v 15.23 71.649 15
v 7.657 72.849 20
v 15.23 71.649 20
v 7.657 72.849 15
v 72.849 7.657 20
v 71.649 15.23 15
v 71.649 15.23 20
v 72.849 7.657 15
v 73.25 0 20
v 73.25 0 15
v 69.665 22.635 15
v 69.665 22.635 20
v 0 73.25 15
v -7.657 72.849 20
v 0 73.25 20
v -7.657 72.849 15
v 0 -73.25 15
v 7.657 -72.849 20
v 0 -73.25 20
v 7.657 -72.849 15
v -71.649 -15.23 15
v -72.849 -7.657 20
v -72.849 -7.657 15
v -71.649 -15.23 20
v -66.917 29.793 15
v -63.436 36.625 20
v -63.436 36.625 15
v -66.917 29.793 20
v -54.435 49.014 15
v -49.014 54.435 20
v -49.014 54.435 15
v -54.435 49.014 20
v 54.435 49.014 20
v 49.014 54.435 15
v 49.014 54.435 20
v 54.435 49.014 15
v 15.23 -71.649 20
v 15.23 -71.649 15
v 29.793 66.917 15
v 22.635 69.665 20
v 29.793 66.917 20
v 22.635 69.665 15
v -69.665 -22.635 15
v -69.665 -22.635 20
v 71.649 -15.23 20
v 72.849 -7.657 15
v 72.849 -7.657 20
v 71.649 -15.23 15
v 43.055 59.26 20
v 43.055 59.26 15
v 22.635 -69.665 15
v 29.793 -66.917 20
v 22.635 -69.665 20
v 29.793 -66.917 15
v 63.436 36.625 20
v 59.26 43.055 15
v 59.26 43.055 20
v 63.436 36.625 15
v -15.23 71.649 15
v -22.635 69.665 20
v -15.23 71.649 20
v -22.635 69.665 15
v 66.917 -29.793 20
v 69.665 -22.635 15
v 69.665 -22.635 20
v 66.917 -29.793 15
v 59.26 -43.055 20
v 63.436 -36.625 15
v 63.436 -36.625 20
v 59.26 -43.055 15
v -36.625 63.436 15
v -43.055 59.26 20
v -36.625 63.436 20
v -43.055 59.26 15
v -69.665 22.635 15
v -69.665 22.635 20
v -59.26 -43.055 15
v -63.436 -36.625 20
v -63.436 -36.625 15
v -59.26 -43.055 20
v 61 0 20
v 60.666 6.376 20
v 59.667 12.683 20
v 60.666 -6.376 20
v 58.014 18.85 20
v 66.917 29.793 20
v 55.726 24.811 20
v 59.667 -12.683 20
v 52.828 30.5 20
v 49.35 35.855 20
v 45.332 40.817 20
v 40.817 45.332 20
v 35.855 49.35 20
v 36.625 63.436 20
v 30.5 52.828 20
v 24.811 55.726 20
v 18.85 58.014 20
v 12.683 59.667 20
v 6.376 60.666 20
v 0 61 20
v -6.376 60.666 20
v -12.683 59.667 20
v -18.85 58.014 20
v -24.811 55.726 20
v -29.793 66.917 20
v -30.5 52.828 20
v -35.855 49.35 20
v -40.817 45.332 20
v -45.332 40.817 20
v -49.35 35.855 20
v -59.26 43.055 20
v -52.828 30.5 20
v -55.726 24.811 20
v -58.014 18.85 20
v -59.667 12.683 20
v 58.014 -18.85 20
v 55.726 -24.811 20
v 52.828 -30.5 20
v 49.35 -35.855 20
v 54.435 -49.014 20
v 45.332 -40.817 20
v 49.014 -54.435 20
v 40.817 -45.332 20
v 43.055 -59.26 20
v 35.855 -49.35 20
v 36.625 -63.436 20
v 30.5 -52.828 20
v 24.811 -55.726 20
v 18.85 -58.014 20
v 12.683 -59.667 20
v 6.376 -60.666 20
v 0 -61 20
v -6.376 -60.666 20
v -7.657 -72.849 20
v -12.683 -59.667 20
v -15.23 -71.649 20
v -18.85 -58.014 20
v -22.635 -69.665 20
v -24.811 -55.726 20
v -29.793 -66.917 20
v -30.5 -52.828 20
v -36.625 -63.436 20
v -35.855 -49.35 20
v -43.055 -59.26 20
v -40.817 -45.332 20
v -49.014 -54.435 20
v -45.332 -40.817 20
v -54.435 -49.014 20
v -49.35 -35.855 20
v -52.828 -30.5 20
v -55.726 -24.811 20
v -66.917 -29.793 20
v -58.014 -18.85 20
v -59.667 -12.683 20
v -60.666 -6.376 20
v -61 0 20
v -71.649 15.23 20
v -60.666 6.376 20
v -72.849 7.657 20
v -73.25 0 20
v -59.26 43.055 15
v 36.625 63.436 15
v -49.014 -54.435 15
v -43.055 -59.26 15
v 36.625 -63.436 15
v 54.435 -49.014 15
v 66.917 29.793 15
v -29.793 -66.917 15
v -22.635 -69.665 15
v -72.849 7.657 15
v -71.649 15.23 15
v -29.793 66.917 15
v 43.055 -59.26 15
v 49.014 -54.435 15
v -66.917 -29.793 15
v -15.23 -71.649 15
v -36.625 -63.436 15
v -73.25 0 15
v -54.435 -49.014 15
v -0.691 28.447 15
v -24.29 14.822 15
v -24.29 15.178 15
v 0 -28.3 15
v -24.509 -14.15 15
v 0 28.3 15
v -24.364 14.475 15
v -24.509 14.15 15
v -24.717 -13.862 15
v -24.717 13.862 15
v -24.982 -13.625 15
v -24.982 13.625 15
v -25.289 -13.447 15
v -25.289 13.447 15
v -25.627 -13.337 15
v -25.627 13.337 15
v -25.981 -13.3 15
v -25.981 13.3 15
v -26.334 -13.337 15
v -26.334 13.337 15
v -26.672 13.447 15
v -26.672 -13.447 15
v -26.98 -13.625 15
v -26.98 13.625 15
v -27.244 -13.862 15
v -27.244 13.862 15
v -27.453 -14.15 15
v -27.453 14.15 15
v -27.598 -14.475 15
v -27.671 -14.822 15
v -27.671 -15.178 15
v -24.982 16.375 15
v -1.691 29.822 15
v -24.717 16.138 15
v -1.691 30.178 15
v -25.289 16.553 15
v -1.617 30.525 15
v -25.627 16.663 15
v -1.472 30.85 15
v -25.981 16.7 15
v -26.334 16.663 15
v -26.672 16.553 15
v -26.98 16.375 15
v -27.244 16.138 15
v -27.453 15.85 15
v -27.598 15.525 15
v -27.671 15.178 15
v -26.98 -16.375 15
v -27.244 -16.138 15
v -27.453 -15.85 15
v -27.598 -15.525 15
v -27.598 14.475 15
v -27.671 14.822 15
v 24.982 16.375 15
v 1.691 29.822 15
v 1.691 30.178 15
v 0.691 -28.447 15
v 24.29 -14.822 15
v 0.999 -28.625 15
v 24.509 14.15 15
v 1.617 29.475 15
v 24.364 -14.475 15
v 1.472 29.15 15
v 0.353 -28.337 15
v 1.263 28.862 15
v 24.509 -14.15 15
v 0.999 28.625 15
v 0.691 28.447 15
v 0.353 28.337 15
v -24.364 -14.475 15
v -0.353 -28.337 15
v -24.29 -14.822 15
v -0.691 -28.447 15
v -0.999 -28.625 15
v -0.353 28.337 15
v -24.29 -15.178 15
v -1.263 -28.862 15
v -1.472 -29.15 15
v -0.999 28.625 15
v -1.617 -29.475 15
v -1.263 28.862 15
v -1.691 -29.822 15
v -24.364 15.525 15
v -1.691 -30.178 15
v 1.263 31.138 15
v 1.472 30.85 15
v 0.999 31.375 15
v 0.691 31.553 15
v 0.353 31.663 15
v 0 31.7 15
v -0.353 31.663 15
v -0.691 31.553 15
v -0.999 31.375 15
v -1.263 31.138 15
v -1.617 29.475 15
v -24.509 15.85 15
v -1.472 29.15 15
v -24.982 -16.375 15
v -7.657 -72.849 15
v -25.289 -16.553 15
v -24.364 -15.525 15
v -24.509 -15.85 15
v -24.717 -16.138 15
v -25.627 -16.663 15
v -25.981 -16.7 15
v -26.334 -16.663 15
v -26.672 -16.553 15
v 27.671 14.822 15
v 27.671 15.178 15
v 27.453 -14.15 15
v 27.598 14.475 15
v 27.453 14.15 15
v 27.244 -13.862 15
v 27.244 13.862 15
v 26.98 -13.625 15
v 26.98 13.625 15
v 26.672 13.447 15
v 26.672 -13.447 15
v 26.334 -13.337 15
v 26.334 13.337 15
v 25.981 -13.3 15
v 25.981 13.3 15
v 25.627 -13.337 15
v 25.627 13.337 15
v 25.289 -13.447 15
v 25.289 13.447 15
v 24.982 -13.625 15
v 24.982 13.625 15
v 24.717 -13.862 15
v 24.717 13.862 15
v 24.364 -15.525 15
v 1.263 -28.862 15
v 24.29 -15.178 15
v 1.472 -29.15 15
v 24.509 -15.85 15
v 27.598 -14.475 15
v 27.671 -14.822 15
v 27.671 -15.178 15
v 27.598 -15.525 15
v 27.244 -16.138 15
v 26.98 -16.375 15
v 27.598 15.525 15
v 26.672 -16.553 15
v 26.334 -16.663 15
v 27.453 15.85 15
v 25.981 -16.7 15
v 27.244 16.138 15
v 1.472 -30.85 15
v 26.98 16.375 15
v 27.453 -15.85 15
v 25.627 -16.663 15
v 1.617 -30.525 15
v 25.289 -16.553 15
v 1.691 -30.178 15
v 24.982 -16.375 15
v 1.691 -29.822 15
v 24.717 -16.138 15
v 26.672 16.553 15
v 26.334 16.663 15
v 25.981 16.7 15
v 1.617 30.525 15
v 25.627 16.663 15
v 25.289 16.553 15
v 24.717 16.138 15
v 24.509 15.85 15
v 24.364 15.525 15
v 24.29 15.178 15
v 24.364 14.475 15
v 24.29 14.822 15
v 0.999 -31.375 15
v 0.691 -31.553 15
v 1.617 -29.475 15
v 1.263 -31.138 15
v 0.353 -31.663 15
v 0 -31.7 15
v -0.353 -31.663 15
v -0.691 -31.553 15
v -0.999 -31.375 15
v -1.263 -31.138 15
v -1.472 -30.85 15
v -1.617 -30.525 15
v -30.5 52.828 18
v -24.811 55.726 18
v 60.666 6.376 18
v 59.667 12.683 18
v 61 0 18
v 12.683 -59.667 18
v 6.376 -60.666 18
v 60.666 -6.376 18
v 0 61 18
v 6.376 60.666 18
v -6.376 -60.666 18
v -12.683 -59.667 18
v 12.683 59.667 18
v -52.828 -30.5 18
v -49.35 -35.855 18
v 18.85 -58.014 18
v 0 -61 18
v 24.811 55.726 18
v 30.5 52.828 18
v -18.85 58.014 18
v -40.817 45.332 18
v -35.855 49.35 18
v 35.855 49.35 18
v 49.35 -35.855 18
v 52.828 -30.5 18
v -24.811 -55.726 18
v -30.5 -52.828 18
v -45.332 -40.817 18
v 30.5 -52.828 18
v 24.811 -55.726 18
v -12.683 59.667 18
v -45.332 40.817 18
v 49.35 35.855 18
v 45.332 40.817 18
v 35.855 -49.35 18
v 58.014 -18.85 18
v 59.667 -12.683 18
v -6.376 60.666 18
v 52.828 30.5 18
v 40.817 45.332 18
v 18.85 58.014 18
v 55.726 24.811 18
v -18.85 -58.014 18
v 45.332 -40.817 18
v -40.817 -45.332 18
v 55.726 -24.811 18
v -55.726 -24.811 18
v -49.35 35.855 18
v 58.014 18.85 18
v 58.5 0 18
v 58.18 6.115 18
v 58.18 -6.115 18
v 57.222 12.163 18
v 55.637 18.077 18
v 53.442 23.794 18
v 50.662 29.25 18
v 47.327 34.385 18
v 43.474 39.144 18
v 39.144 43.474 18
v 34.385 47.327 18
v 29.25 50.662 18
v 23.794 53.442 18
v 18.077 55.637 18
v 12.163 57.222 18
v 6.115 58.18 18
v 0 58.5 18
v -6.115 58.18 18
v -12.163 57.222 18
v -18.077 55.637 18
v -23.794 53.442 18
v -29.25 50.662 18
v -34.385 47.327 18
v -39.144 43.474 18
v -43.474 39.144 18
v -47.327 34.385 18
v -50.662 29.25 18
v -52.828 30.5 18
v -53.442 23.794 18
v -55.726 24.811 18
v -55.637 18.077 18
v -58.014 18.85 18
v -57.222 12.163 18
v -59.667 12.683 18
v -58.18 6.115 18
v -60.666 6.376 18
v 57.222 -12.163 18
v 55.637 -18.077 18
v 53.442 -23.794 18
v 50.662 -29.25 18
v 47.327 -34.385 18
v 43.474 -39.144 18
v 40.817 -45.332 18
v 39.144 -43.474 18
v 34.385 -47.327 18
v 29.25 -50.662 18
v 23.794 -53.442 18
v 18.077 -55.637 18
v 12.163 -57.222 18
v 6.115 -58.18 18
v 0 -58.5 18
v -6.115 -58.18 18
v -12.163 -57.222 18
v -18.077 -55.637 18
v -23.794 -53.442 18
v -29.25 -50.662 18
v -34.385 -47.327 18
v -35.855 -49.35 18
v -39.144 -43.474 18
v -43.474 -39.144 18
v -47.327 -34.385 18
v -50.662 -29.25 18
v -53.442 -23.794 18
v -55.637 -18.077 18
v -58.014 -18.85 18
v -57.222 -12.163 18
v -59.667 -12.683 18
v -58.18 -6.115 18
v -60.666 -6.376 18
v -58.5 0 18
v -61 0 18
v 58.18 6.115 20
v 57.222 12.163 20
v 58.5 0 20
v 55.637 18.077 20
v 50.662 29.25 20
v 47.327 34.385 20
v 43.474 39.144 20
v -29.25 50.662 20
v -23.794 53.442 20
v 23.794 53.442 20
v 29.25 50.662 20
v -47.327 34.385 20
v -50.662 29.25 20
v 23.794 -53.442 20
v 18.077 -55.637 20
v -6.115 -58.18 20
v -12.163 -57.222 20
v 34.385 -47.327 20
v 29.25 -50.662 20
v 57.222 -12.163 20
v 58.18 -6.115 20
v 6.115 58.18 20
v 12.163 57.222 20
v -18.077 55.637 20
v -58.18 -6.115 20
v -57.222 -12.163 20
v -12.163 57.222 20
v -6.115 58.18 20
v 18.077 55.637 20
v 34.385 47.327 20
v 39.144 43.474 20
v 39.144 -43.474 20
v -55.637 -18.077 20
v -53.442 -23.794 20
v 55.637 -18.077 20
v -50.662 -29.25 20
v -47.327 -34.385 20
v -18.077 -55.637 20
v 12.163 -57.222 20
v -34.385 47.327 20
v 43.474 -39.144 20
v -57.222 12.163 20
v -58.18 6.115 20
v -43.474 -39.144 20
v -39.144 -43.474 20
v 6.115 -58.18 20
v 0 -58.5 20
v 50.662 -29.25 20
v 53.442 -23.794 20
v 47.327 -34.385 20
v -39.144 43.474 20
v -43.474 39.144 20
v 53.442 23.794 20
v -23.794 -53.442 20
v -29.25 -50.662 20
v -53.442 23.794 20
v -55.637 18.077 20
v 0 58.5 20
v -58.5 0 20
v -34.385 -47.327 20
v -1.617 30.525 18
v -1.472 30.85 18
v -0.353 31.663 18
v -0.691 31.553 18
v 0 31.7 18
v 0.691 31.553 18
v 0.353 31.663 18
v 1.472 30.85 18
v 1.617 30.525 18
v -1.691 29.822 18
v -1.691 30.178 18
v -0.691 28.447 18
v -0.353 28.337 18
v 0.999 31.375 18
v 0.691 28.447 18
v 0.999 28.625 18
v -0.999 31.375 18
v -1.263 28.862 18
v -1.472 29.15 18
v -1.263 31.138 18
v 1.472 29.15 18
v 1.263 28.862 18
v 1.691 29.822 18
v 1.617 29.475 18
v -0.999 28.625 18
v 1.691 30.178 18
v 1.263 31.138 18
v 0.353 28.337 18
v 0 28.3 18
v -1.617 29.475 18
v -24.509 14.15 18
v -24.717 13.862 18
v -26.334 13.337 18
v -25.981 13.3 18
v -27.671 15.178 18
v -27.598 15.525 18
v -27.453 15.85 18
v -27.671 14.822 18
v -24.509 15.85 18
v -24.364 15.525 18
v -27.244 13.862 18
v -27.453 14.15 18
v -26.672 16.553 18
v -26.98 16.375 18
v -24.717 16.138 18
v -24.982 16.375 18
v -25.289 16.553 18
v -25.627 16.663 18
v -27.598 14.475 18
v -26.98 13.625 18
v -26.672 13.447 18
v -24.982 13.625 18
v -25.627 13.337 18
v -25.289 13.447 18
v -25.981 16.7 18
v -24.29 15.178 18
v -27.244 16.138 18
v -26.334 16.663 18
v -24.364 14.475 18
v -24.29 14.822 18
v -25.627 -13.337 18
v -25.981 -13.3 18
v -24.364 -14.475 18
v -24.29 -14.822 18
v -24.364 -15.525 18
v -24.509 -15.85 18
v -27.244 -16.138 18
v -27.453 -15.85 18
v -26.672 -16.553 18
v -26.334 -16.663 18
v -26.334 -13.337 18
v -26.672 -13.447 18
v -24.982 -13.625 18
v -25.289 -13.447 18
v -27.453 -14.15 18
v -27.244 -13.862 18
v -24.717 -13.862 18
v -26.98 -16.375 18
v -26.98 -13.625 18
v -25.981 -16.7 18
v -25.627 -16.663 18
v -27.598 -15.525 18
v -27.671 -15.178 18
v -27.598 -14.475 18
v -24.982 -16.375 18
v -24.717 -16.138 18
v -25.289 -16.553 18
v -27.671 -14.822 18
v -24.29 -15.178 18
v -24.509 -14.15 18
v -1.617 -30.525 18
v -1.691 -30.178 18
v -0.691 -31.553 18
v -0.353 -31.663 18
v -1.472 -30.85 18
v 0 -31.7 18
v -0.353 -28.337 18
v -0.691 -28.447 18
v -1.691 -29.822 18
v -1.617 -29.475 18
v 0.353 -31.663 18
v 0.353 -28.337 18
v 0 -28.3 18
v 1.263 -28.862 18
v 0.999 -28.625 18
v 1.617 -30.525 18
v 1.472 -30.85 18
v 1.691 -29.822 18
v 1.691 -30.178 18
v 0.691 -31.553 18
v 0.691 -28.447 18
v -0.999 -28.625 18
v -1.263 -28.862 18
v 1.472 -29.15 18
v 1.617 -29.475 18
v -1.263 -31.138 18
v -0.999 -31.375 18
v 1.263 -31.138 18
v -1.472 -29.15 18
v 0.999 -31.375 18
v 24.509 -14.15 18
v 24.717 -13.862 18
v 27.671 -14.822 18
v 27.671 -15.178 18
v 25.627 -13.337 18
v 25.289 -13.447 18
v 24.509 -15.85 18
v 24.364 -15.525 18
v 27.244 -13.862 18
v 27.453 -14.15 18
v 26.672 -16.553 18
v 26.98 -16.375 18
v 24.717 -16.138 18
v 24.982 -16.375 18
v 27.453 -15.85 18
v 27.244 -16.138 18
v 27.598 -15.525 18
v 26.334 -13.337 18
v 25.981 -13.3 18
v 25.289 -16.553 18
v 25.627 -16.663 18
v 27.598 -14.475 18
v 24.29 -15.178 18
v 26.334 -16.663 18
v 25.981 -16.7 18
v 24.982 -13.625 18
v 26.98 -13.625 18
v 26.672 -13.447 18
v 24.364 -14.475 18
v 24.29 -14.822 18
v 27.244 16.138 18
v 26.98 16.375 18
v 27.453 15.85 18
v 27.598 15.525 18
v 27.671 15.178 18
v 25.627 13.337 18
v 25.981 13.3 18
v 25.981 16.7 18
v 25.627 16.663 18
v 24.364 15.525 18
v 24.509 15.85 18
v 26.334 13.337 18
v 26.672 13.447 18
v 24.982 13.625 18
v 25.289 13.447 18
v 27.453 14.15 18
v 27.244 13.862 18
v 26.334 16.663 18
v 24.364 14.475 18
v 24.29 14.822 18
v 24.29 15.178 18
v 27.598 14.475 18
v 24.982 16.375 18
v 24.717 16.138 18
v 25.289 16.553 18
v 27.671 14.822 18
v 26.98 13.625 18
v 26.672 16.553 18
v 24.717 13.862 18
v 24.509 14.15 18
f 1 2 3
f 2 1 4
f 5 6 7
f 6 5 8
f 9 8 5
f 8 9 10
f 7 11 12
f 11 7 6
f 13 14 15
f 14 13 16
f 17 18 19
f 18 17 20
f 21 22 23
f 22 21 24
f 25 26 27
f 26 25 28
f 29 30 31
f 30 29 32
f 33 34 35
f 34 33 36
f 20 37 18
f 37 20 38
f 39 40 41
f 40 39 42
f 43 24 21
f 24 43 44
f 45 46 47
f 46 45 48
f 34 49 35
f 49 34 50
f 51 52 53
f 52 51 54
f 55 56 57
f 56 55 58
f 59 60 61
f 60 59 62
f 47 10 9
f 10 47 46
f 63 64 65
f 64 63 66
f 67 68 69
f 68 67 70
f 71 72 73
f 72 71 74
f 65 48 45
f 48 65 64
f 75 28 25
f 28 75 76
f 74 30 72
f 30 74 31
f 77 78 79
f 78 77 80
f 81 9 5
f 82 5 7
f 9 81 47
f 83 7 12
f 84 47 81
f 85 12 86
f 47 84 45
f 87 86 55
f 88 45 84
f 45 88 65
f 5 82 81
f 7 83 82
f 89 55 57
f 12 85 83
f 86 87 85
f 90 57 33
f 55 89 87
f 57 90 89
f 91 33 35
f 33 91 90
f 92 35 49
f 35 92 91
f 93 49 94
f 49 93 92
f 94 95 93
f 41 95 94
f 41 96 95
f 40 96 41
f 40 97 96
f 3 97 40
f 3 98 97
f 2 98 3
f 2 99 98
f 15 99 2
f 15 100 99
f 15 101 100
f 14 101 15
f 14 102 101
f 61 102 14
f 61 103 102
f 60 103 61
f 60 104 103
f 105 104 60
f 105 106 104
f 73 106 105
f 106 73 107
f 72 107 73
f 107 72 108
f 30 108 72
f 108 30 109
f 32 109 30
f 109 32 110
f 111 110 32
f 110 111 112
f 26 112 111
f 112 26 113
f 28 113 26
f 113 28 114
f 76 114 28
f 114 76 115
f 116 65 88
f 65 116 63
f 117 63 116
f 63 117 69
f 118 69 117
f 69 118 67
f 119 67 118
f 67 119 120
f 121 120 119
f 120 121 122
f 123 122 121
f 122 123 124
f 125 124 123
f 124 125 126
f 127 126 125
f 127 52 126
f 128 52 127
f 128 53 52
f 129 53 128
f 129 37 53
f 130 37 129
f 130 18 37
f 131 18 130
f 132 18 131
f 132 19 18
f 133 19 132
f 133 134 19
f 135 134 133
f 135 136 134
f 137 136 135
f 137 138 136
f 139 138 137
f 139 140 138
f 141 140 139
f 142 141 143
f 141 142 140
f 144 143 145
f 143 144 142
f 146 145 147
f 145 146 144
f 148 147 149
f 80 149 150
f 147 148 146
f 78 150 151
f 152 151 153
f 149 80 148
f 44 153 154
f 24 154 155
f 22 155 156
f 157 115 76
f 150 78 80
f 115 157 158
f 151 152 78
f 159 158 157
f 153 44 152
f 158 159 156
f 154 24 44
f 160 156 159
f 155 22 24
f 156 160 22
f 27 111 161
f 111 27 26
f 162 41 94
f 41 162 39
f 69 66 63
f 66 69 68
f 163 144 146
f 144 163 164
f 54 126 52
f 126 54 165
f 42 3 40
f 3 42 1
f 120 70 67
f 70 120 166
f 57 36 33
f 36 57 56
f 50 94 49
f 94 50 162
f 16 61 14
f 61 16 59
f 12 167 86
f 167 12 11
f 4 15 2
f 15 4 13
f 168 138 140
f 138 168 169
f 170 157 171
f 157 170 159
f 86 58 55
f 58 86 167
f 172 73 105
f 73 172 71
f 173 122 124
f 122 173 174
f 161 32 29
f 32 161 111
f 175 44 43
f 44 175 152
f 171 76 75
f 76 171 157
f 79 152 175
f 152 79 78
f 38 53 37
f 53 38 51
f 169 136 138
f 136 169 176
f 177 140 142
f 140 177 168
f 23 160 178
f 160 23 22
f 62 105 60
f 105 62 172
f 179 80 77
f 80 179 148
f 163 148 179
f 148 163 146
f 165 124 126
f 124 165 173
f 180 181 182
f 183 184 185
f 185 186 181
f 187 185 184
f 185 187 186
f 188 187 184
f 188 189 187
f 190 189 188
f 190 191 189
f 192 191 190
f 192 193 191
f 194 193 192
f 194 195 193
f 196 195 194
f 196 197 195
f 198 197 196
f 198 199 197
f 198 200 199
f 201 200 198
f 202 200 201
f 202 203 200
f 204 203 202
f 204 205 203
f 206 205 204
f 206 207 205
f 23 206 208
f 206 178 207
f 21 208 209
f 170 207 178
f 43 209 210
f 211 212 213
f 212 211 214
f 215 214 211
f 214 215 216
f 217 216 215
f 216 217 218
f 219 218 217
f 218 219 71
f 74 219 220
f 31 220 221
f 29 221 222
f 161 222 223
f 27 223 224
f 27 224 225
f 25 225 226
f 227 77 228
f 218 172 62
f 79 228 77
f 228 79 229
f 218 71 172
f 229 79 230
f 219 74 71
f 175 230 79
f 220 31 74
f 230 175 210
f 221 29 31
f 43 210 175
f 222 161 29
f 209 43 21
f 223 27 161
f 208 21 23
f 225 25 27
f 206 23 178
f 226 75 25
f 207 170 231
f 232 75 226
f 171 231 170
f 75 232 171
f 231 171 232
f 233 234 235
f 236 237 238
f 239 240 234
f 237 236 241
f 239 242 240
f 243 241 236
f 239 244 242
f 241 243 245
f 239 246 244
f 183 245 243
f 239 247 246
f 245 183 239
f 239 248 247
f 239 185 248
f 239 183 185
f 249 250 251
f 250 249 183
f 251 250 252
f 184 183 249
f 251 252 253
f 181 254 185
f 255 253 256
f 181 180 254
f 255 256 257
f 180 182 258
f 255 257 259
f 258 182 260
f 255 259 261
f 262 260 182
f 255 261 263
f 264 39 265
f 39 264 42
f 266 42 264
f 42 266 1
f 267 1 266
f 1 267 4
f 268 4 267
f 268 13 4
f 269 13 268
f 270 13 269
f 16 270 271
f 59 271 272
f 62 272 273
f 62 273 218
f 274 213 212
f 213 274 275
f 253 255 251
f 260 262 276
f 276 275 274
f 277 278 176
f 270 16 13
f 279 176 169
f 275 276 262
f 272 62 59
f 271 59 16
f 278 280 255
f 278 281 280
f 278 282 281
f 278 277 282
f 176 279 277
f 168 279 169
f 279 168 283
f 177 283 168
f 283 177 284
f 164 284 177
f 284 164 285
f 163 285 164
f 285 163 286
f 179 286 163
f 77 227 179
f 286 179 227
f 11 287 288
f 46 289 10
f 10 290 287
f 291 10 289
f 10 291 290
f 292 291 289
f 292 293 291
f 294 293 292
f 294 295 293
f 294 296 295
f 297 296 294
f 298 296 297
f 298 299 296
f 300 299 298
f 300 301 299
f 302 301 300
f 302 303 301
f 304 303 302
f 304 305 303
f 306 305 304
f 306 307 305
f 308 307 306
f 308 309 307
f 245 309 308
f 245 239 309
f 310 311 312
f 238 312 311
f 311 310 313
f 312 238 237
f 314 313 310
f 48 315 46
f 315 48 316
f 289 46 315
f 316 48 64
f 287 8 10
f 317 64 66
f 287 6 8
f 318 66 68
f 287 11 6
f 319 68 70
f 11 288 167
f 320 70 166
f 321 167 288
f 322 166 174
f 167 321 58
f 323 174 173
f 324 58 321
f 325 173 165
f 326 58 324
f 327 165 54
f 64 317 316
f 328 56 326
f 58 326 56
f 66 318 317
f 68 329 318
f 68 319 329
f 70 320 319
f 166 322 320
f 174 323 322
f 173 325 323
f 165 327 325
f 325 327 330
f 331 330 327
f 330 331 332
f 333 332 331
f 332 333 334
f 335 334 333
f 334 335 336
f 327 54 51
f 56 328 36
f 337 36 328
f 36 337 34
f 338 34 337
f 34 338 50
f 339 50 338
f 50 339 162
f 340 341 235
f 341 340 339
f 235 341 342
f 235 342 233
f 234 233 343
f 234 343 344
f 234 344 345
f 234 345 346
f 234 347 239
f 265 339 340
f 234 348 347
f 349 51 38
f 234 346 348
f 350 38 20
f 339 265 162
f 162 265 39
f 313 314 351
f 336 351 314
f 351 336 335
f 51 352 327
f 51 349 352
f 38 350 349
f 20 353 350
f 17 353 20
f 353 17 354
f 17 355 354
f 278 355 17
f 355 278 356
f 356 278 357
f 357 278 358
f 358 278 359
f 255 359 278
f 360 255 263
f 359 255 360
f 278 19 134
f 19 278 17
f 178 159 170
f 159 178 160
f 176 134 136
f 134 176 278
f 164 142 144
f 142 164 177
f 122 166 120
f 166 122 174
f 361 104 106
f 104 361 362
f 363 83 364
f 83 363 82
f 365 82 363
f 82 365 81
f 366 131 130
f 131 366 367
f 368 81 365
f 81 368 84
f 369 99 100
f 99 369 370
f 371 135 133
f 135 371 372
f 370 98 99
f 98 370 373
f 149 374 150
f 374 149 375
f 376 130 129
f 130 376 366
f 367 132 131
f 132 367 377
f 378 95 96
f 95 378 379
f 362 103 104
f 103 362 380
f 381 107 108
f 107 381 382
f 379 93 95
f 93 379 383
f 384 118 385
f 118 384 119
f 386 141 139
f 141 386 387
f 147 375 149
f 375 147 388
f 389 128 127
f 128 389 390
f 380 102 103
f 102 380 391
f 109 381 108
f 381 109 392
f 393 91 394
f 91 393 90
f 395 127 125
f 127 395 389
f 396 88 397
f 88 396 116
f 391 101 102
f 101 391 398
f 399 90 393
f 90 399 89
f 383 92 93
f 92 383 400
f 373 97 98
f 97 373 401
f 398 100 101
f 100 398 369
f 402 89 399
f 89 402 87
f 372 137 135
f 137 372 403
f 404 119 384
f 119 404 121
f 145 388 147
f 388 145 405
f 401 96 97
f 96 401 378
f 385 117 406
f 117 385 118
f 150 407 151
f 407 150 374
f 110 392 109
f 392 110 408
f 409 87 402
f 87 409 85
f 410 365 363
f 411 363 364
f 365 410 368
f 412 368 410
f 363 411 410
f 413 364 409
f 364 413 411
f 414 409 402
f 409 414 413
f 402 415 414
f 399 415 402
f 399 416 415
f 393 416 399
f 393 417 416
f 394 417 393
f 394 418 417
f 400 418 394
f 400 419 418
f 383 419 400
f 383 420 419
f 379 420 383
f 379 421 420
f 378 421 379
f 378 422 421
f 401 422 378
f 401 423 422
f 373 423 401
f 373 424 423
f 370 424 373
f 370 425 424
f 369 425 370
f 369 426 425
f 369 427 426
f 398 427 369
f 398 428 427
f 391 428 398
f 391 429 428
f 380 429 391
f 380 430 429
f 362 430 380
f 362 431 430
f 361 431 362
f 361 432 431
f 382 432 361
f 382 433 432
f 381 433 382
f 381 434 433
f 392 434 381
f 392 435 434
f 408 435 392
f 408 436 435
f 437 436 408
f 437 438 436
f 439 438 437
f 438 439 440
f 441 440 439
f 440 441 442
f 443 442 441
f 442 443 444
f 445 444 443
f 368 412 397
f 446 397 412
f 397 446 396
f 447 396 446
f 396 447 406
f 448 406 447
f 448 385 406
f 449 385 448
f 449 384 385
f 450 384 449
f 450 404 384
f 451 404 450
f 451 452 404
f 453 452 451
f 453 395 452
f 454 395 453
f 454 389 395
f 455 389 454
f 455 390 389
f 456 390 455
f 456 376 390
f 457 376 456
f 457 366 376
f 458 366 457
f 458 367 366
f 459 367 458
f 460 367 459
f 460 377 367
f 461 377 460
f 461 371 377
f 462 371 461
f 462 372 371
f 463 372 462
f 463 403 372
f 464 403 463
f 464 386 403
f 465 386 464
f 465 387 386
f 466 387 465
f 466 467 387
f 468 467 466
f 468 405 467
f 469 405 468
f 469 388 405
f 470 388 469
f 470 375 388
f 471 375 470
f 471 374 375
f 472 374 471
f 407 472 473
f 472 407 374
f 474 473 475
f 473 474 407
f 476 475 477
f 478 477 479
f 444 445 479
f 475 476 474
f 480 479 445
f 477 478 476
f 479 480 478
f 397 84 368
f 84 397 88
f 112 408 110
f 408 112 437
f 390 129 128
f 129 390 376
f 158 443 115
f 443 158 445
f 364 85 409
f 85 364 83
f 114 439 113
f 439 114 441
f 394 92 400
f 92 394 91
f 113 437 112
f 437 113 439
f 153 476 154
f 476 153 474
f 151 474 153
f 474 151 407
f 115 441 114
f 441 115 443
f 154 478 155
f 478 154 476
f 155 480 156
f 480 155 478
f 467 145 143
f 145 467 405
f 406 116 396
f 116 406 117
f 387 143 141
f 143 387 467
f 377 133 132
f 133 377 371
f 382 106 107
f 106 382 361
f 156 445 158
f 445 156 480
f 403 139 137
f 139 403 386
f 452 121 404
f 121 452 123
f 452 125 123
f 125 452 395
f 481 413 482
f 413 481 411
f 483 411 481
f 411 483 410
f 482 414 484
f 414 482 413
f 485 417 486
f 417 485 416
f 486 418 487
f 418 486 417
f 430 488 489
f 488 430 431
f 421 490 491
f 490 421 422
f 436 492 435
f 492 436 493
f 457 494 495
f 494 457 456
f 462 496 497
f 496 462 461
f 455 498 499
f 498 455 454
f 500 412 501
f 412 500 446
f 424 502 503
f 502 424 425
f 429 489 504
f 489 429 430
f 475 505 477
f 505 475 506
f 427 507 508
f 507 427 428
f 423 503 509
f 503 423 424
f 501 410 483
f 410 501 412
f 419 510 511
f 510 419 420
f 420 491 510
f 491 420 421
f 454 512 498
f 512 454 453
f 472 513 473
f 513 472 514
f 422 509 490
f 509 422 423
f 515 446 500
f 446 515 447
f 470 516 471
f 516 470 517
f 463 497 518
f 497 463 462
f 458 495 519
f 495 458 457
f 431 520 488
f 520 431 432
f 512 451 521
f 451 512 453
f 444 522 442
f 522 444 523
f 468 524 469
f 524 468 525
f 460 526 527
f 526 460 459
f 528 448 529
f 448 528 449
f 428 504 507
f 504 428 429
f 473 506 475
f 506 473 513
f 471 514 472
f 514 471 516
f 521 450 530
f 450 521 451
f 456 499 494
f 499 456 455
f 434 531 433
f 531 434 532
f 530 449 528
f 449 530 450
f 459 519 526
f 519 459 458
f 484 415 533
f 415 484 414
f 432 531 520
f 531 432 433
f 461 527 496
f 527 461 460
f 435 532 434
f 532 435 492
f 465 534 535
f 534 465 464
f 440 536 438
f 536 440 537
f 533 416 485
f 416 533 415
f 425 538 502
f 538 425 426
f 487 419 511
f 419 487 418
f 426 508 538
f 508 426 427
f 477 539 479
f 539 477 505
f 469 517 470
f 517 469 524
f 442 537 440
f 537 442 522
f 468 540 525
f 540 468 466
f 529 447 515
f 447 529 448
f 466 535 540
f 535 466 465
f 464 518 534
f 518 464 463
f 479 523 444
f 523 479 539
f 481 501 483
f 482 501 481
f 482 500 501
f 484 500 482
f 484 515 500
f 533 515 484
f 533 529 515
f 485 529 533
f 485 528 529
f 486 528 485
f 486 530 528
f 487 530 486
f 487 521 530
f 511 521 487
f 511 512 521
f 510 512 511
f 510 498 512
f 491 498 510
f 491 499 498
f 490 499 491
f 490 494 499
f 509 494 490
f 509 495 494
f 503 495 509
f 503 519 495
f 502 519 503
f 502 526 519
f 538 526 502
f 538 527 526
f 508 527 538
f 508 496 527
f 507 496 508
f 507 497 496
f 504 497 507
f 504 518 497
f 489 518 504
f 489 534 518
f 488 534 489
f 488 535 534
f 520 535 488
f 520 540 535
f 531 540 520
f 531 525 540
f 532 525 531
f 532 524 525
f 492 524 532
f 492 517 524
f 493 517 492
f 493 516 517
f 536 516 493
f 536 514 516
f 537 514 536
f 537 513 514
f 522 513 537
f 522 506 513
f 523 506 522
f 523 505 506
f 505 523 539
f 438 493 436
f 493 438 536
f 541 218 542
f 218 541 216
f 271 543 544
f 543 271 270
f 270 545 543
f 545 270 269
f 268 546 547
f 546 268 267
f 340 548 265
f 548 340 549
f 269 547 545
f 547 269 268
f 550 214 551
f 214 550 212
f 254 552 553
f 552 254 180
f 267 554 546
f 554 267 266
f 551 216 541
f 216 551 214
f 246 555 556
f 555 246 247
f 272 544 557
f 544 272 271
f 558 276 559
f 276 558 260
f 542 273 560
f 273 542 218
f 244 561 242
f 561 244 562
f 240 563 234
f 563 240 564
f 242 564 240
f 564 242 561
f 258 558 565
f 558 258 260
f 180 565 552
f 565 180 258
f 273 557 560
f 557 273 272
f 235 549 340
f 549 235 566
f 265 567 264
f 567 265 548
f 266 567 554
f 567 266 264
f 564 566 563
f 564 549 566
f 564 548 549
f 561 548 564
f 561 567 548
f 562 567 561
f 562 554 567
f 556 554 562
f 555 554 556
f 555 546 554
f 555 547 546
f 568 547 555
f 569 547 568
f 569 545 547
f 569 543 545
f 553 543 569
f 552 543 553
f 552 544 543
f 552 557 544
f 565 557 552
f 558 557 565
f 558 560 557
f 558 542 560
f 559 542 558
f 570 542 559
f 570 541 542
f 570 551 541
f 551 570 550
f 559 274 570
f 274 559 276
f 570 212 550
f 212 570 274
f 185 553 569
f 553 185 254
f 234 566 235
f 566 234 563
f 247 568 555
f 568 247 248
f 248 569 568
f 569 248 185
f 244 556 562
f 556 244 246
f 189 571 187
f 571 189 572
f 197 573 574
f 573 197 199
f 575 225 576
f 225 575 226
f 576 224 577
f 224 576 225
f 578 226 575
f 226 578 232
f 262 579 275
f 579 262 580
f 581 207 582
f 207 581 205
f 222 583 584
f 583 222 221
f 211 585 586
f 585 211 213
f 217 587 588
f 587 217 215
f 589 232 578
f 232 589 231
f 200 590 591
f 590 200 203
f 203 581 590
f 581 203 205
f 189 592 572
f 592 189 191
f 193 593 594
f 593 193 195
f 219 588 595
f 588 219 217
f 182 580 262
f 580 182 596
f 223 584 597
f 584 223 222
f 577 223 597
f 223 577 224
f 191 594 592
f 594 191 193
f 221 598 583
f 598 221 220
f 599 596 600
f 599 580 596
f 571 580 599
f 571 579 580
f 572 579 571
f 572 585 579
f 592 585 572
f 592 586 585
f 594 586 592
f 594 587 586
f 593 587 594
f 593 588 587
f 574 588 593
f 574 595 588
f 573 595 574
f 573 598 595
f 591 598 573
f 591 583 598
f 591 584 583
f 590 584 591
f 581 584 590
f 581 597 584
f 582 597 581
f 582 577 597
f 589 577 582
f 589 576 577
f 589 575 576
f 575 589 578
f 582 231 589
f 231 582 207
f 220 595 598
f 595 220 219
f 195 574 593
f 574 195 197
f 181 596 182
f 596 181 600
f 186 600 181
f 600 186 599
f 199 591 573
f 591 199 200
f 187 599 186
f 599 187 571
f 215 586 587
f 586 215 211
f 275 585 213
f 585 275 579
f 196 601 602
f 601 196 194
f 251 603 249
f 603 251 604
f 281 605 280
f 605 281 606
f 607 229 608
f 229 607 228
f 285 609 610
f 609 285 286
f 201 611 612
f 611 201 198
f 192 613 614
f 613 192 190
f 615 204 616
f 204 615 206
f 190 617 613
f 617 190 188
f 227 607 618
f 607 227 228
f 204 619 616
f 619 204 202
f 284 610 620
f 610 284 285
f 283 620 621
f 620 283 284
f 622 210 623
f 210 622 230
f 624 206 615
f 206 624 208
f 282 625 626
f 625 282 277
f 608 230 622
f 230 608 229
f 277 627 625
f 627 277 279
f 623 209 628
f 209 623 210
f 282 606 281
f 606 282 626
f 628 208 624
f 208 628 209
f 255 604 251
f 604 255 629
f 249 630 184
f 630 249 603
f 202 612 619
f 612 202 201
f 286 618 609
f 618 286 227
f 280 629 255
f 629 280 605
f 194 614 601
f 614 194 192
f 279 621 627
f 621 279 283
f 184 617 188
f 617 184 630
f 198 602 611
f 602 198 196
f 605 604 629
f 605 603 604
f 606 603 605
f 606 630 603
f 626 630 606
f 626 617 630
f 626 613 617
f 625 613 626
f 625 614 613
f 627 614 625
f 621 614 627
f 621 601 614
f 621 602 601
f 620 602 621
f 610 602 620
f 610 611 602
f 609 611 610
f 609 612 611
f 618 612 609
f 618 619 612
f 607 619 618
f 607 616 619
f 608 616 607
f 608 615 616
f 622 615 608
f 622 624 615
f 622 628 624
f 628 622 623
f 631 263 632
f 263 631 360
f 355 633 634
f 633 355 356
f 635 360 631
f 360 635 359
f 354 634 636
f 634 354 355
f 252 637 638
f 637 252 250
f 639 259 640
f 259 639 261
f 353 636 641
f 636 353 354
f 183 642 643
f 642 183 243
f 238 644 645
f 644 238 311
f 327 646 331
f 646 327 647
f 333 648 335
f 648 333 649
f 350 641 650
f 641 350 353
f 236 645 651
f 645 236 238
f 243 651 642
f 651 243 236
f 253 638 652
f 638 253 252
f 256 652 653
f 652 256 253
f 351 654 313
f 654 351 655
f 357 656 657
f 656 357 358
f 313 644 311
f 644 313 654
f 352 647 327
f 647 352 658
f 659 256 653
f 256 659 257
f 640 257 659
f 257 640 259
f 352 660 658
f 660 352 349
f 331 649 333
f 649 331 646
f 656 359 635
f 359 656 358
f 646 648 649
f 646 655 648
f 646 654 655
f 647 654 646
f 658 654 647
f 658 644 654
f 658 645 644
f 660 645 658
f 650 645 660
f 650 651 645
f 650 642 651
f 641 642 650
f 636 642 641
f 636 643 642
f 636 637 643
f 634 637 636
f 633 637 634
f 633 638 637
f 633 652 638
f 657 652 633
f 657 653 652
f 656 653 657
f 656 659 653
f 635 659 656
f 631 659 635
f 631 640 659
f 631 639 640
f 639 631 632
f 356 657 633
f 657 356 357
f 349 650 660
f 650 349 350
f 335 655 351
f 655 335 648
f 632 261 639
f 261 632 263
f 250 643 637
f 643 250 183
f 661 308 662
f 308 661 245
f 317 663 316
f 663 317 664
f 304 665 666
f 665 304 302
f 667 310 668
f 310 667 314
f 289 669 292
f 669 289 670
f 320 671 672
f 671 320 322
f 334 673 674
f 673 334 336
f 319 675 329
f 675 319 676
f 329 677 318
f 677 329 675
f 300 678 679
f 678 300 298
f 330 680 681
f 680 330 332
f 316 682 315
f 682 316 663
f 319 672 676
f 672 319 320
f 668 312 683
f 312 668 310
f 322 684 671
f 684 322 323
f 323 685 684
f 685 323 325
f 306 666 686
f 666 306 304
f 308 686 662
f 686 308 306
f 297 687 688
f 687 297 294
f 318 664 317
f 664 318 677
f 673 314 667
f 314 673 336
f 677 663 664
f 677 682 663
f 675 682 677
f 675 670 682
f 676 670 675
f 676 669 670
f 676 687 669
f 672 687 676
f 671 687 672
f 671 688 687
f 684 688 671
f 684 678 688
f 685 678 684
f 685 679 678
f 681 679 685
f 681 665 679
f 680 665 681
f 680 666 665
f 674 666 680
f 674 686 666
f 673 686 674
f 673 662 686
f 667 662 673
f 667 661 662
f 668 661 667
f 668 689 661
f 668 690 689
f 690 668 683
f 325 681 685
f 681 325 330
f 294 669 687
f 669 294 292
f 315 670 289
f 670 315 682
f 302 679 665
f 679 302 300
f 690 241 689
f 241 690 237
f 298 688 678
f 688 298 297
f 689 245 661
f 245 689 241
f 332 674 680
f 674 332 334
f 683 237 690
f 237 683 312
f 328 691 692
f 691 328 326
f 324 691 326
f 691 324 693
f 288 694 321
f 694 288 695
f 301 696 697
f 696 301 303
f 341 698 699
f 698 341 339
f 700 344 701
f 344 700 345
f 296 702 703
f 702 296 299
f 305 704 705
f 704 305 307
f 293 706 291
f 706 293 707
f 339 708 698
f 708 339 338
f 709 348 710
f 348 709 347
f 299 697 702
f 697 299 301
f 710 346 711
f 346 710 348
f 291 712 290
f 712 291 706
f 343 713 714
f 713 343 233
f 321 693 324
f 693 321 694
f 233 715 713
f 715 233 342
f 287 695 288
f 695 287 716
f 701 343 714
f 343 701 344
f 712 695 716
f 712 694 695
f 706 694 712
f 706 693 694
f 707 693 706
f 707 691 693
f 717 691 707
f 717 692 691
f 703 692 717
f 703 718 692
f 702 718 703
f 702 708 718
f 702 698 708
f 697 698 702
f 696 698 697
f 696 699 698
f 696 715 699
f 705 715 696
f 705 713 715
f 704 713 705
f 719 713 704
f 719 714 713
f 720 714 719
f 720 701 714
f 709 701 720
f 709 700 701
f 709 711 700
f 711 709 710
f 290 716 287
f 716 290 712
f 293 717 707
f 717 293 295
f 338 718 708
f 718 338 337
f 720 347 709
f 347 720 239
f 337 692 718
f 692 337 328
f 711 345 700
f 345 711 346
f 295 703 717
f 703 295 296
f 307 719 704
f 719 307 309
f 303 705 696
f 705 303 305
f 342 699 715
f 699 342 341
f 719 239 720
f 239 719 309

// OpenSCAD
// file: flybase.scad
//Buridan paradigm///
//fly plaform v0.1//
//CC BY SA 4.0 //
// first design by Andre Maia Chagas 17/01/2025//
//units in mm //


platD = 117;
platH = 5;
platEdgeD = 146.5;//platD+8;
tolerance = 0.1;
$fn=60;
matrixL = 192;//127.7;
matrixH = 192;//127.7;

module platform(){

//make platform
difference(){
cylinder(d=platEdgeD,h=platH,$fn=60);
translate([0,0,3]){
cylinder(d=platD+5,h=2.5);
}//end translate
}//end difference
cylinder(d=platD,h=platH);
//%cylinder(d=platEdgeD+22.8,h=platH,$fn=6);

}//end module

module screens(){
for(i=[0:60:301]){
rotate([0,0,i]){
translate([-matrixL/2,platEdgeD/2+95,0]){
cube([matrixL,12,matrixH]);
        }
    }
/*
*/
}
}//end module

module sticks(){
  for(i=[0:60:301]){  
     //measuring "sticks"
    rotate([0,0,i+90])
translate([170/2,0,10]){
cube([170,10,2],center=true);
}//end translate
  
    }//end for
}//end module

module beams(r=180){
    for(i=[0:60:301]){  
rotate([0,0,i]){
translate([-150/2,r,0]){
color("green")cube([150,15,15]);
}
translate([-150/2,r,165]){
color("green")cube([150,15,15]);
}
rotate([0,90,0]){
translate([-150-15,r,80/2]){
color("blue")cube([150,15,15]);
}
}
rotate([0,90,0]){
translate([-150-15,r,-80/2]){
color("blue")cube([150,15,15]);
}
}
}

        }//end for

        for(i=[0:180:301]){  
rotate([0,0,i+90])
translate([25,-15/2,-0]){
cube([150,15,15]);          
}//end translate

}

    }//end module

module connectors(){
translate([-179/2,155,0]){  
  translate([-40/2,40/2,0])   
color("red")cube([50,20,20]);
rotate([0,0,60]){
translate([-40/2,40/2,0]){
color("red")cube([50,20,20]);
}//end translate

}//end rotate

}//end translate
}//end module


//sticks();
platform();
screens();

translate([0,0,-18]){
beams();
//connectors();
}

//possible join?
//difference(){
//    translate([0,-2.5,-2.5]){rotate([0,0,-30])connectors();}
//    rotate([0,0,-30])beams();}
// main file
use <flybase.scad>
use <fillets_and_rounds.scad>

module green_beams(w=15,h=15,l=150,r=180){
    if(h==0){h=w;}
    for(i=[0:60:301]){  
rotate([0,0,i]){
translate([-l/2,r,0]){
color("green")cube([l,w,h]);
}}}}

module side_holes(w=3.3,l=60,r=180, n=25, spacing=1,fn=6,buffer=40){
    for(i=[0:60:301]){  
rotate([0,0,i]){
    for(k=[0:spacing:n]){
translate([buffer+k,r,0]){
rotate([90,0,0])cylinder(h=l,d=w,$fn=fn,center=true);}
    translate([-buffer-k,r,0]){
rotate([90,0,0])cylinder(h=l,d=w,$fn=fn,center=true);}
}}}}

module columns(d,h,n,r,fn=6,center=true){
    for(i=[1:1:n]){
        rotate([0,0,i*360/n]){translate([r,0,0])cylinder(d=d,h=h,$fn=fn,center=center);}
    }//end for
}//end columns

module center_spokes(){
rotate([0,0,30])green_beams(w=200,h=15.5,l=15.5,r=15);
translate([0,0,7.5]){rotate([0,0,30])side_holes(n=0,buffer=0,r=150,l=250,w=3.5);}
translate([0,0,7.5]){rotate([0,0,30])side_holes(n=0,buffer=0,r=228,l=20,w=7.2,fn=6);}}

module main_assembly(){
difference(){
    //main shape
    translate([0,0,-5])green_beams(w=20,h=20,l=228.5,r=178);
    // cut out actual beams
    green_beams(w=15.5+1.5,h=15.5);
    //split into segments
    translate([0,0,-10])green_beams(w=60,h=60,l=70,r=175);
    //add nut slots for easier assembly
    translate([0,0,15-3.6])green_beams(w=5.7,h=3.7,l=250,r=185);
    translate([0,0,7.5])side_holes(w=3.5);
    
    center_spokes();
    
    rotate([0,0,15])columns(n=12,d=3.5,h=10,r=195);
    translate([0,0,-7])rotate([0,0,15])columns(n=12,d=7,h=10,r=195,center=true);
}//end difference
}
//main_assembly();

module single_hex_join(){
    intersection(){
        main_assembly();
        translate([100,150,0])cube(150,center=true);
    }
}//end single_hex_join

//single_hex_join();

module new_flybase(){
    difference(){
        translate([0,0,0])platform();
        translate([0,0,1.5]){rotate([0,0,30])columns(d=3.4,r=30,h=3,n=6,fn=30);}
    }//end difference
}//end new_flybase

translate([0,0,15])new_flybase();

module center_join(){
difference(){
translate([0,0,-4.5])cylinder(d=100,h=20,$fn=60);
center_spokes();
columns(d=3.4,h=30,r=40,n=6);
    translate([0,0,-17])columns(d=7.2,h=30,r=40,n=6);
    columns(d=3.4,h=30,r=25,n=6);
    translate([0,0,-17])columns(d=7.2,h=30,r=25,n=6);
    translate([0,0,14]){rotate([0,0,30])columns(d=3.4,r=30,h=3,n=6,fn=30);}
}}

//center_join();

module camera_joints(l=360,r=195.5,size=120){
    $fn=6;
    offset=5;
    difference(){
        translate([-7.5,l/2-size+30.5+offset,l-size+15+offset])cube([20,size,size]);
        translate([-7.5,l/2-size+30.5+offset,l]){rotate([-135,0,0])cube(size*2);}
        
        add_rounds(R=offset,fn=20,axis="x"){translate([0,0,0]){difference(){
            translate([-7.5,l/2-size+15-offset,l-size-offset]){cube([20,size,size]);}
        translate([-7.5,l/2-size+30.5+offset+size/10,l+size/10]){rotate([-135,0,0]){cube(size*2);}}}
        }}//end translate / rounds
        
        translate([0,r+15/2,l/2])cube([15,15,l],center=true);
        translate([0,-r-15/2,l/2])cube([15,15,l],center=true);
        translate([0,0,l+15/2])cube([15,l,15],center=true);
        
        //screw holes
        translate([0,r+15/2,l-10]){rotate([0,90,0])cylinder(d=3.5,h=40,center=true);}
        translate([0,r+15/2,l-size/2]){rotate([0,90,0])cylinder(d=3.5,h=40,center=true);}
        translate([size/2+7.5+2,r+15/2,l-10]){rotate([0,90,0])cylinder(d=6.6,h=size,center=true);}
        translate([size/2+7.5+2,r+15/2,l-size/2]){rotate([0,90,0])cylinder(d=6.6,h=size,center=true);}
        
        
        translate([0,r+15/2,l-30]){rotate([0,90,90])cylinder(d=3.5,h=40,center=true);}
        translate([0,r+17+size/2,l-30]){rotate([0,90,90])cylinder(d=6.6,h=size,center=true);}
        translate([0,r+15/2,l-size/2-20]){rotate([0,90,90])cylinder(d=3.5,h=size,center=true);}
        translate([0,r-2-size/2,l-size/2-20]){rotate([0,90,90])cylinder(d=6.6,h=size,center=true);}
        
        translate([0,r-25,l+7.5]){rotate([0,90,0])cylinder(d=3.5,h=40,center=true);}
        translate([0,r-size/2,l+7.5]){rotate([0,90,0])cylinder(d=3.5,h=40,center=true);}
        translate([size/2+7.5+2,r-25,l+7.5]){rotate([0,90,0])cylinder(d=6.6,h=size,center=true);}
        translate([size/2+7.5+2,r-size/2,l+7.5]){rotate([0,90,0])cylinder(d=6.6,h=size,center=true);}
        
        translate([0,r-40,l+7.5]){rotate([0,0,0])cylinder(d=3.5,h=40,center=true);}
        translate([0,r-40,l+17+size/2]){rotate([0,0,0])cylinder(d=6.6,h=size,center=true);}
        translate([0,r-size/2-20,l+7.5]){rotate([0,0,0])cylinder(d=3.5,h=size,center=true);}
        translate([0,r-size/2-20,l-2-size/2]){rotate([0,0,0])cylinder(d=6.6,h=size,center=true);}
        
    }//end difference
}//end camera_joints

//camera_joints();
